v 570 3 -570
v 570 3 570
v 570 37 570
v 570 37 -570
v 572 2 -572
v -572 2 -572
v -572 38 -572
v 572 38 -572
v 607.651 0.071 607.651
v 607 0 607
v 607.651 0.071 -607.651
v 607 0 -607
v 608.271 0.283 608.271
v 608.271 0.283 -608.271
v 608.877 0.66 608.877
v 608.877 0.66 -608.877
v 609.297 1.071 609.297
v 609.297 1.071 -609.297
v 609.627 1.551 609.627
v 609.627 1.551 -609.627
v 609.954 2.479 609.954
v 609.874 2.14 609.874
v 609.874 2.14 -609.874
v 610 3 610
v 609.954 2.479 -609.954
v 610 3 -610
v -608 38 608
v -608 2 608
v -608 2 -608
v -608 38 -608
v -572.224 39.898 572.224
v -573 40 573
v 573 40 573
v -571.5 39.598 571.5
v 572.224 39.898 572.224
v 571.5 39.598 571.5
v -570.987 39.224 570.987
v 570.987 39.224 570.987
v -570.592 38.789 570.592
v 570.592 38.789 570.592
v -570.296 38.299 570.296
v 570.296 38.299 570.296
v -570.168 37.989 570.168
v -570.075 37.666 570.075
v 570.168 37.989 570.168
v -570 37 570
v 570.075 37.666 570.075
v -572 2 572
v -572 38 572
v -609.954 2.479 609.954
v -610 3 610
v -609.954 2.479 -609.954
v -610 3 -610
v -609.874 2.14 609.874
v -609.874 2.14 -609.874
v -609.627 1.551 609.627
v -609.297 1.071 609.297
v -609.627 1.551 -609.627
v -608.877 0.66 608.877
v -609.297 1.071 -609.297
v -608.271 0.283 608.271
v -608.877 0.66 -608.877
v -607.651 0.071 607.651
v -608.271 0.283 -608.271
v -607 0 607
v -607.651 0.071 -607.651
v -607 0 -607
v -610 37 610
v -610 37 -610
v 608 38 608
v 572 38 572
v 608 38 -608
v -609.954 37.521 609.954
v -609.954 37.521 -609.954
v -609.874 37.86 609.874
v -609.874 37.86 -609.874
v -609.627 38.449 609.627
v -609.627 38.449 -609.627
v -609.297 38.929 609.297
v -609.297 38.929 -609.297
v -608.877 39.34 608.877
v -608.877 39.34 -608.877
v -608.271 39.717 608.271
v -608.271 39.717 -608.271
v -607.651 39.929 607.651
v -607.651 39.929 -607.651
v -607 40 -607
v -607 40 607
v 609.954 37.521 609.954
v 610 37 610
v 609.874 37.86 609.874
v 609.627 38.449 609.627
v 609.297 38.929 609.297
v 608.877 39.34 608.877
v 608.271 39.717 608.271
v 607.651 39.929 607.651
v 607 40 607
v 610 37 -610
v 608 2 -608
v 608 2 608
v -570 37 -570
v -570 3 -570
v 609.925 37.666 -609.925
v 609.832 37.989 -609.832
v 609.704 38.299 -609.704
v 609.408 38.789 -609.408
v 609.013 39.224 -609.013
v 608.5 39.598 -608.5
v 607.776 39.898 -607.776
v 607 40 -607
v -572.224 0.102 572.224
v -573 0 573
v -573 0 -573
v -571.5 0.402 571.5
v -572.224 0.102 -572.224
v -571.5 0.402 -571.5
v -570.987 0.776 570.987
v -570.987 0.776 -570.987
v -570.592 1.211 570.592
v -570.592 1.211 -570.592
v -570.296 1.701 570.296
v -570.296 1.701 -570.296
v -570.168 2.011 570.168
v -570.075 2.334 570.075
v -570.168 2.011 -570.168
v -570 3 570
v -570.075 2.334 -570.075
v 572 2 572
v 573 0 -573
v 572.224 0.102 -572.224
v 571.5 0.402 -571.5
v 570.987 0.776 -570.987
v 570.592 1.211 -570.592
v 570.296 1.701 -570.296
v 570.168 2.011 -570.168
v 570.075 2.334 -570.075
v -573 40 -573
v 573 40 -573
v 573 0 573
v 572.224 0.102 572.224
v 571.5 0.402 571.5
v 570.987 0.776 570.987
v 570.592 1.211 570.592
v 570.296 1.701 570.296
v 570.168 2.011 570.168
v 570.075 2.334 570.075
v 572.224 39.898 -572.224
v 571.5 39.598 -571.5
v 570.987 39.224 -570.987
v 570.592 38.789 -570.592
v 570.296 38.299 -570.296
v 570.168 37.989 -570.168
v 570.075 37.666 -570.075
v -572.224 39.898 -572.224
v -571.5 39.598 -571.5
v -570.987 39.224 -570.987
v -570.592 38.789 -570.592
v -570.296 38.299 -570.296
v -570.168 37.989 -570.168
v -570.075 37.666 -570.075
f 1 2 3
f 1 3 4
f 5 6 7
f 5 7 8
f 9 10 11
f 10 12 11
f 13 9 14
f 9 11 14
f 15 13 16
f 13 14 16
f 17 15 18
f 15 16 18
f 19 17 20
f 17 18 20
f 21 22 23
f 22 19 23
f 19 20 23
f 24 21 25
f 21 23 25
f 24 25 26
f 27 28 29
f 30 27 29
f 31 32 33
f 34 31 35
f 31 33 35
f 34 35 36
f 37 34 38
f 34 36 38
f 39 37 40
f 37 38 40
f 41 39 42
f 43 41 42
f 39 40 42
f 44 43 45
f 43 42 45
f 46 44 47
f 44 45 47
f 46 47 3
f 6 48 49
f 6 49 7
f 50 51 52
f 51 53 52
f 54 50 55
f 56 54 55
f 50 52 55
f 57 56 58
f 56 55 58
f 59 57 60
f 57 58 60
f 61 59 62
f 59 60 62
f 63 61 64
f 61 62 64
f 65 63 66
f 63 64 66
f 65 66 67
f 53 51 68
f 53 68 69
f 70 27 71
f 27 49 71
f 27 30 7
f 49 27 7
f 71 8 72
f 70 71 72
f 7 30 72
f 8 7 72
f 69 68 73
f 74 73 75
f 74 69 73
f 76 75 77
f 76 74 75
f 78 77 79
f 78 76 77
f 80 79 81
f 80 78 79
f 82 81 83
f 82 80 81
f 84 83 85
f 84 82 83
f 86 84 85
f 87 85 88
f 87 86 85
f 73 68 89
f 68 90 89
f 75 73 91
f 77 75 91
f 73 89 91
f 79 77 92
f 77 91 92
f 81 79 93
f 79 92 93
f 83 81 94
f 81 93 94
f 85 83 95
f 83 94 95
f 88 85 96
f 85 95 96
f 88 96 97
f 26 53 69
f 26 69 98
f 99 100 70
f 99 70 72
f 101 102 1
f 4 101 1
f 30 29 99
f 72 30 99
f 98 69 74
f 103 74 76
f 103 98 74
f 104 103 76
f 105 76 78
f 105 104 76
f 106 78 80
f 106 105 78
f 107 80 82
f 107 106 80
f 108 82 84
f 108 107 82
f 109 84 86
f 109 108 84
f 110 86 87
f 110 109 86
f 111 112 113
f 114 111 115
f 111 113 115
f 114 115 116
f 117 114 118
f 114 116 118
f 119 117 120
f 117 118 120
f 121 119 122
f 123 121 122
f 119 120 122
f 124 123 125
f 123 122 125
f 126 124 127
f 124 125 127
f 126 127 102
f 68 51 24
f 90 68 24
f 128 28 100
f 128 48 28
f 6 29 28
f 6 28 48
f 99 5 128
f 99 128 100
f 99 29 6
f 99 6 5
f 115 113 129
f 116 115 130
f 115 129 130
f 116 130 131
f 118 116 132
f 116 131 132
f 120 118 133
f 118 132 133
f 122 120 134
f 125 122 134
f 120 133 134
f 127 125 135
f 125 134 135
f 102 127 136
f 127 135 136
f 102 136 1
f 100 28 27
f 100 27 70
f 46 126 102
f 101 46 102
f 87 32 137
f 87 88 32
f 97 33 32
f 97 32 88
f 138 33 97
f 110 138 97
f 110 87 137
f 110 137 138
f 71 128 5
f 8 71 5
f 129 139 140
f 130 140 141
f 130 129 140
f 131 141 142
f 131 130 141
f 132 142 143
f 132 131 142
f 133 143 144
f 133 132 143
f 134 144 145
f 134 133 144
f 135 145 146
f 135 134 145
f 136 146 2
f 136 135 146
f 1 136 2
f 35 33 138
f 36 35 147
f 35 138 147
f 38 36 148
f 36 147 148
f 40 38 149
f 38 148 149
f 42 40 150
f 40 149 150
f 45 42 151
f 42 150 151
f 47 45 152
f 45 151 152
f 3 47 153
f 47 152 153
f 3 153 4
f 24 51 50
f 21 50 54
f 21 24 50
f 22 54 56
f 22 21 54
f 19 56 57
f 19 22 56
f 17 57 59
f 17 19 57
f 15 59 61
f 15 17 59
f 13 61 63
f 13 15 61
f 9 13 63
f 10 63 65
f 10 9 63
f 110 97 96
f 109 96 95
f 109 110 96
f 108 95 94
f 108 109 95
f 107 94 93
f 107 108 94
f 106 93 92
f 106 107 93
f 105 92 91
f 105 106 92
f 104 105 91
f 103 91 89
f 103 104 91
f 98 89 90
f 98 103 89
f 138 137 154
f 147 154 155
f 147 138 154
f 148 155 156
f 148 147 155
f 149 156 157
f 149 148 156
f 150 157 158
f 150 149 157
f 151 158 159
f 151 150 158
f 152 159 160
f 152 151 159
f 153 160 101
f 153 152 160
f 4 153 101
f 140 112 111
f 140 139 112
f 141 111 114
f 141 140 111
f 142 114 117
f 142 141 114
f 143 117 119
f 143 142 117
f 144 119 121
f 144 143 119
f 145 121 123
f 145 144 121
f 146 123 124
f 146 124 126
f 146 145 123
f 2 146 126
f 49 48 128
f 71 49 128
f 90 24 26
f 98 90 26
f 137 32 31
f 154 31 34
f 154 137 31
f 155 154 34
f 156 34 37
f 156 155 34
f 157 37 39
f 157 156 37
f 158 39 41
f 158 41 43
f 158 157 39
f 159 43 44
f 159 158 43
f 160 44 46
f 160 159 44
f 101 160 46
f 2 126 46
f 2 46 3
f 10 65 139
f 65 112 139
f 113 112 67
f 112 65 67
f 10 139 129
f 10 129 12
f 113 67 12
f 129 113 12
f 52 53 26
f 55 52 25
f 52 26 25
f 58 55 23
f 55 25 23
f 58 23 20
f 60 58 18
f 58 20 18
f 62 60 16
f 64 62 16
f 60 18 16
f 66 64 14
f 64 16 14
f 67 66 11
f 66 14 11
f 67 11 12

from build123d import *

# Parameters (mm, degrees)
SKETCH1_W           = 1220
SKETCH1_H           = 1220
SKETCH1_W_2         = 1140
SKETCH1_H_2         = 1140
BOSS_EXTRUDE1_DEPTH = 40
SHELL1_START        = 2
SHELL1_OUTLINE_W    = 1216
SHELL1_OUTLINE_H    = 1216
SHELL1_OUTLINE_W_2  = 1144
SHELL1_OUTLINE_H_2  = 1144
SHELL1_DEPTH        = 36
FILLET1_R           = 3


# Read off the part's stored shape, not the designer's step: Shell1
with BuildPart() as part:
    # Sketch1 → Boss-Extrude1 (new body)
    with BuildSketch(Plane(origin=(0, 0, 0), x_dir=(1, 0, 0), z_dir=(0, 1, 0))):
        Rectangle(SKETCH1_W, SKETCH1_H)
        Rectangle(SKETCH1_W_2, SKETCH1_H_2, mode=Mode.SUBTRACT)
    extrude(amount=BOSS_EXTRUDE1_DEPTH)

    # Shell1 outline → Shell1 (cut)
    with BuildSketch(Plane(origin=(0, 0, 0), x_dir=(1, 0, 0), z_dir=(0, 1, 0)).offset(SHELL1_START)):
        Rectangle(SHELL1_OUTLINE_W, SHELL1_OUTLINE_H)
        Rectangle(SHELL1_OUTLINE_W_2, SHELL1_OUTLINE_H_2, mode=Mode.SUBTRACT)
    extrude(amount=SHELL1_DEPTH, mode=Mode.SUBTRACT)

    # Fillet1
    fillet1_edges = [part.edges().sort_by_distance(p)[0] for p in [
        (-610, 40, 0),
        (0, 40, 610),
        (570, 0, 0),
        (0, 0, -570),
        (-570, 0, 0),
        (0, 0, 570),
        (570, 40, 0),
        (0, 40, -570),
        (-570, 40, 0),
        (0, 40, 570),
        (610, 40, 0),
        (0, 0, 610),
        (-610, 0, 0),
        (0, 0, -610),
        (610, 0, 0),
        (0, 40, -610),
    ]]
    fillet(fillet1_edges, radius=FILLET1_R)


solid = part.part
